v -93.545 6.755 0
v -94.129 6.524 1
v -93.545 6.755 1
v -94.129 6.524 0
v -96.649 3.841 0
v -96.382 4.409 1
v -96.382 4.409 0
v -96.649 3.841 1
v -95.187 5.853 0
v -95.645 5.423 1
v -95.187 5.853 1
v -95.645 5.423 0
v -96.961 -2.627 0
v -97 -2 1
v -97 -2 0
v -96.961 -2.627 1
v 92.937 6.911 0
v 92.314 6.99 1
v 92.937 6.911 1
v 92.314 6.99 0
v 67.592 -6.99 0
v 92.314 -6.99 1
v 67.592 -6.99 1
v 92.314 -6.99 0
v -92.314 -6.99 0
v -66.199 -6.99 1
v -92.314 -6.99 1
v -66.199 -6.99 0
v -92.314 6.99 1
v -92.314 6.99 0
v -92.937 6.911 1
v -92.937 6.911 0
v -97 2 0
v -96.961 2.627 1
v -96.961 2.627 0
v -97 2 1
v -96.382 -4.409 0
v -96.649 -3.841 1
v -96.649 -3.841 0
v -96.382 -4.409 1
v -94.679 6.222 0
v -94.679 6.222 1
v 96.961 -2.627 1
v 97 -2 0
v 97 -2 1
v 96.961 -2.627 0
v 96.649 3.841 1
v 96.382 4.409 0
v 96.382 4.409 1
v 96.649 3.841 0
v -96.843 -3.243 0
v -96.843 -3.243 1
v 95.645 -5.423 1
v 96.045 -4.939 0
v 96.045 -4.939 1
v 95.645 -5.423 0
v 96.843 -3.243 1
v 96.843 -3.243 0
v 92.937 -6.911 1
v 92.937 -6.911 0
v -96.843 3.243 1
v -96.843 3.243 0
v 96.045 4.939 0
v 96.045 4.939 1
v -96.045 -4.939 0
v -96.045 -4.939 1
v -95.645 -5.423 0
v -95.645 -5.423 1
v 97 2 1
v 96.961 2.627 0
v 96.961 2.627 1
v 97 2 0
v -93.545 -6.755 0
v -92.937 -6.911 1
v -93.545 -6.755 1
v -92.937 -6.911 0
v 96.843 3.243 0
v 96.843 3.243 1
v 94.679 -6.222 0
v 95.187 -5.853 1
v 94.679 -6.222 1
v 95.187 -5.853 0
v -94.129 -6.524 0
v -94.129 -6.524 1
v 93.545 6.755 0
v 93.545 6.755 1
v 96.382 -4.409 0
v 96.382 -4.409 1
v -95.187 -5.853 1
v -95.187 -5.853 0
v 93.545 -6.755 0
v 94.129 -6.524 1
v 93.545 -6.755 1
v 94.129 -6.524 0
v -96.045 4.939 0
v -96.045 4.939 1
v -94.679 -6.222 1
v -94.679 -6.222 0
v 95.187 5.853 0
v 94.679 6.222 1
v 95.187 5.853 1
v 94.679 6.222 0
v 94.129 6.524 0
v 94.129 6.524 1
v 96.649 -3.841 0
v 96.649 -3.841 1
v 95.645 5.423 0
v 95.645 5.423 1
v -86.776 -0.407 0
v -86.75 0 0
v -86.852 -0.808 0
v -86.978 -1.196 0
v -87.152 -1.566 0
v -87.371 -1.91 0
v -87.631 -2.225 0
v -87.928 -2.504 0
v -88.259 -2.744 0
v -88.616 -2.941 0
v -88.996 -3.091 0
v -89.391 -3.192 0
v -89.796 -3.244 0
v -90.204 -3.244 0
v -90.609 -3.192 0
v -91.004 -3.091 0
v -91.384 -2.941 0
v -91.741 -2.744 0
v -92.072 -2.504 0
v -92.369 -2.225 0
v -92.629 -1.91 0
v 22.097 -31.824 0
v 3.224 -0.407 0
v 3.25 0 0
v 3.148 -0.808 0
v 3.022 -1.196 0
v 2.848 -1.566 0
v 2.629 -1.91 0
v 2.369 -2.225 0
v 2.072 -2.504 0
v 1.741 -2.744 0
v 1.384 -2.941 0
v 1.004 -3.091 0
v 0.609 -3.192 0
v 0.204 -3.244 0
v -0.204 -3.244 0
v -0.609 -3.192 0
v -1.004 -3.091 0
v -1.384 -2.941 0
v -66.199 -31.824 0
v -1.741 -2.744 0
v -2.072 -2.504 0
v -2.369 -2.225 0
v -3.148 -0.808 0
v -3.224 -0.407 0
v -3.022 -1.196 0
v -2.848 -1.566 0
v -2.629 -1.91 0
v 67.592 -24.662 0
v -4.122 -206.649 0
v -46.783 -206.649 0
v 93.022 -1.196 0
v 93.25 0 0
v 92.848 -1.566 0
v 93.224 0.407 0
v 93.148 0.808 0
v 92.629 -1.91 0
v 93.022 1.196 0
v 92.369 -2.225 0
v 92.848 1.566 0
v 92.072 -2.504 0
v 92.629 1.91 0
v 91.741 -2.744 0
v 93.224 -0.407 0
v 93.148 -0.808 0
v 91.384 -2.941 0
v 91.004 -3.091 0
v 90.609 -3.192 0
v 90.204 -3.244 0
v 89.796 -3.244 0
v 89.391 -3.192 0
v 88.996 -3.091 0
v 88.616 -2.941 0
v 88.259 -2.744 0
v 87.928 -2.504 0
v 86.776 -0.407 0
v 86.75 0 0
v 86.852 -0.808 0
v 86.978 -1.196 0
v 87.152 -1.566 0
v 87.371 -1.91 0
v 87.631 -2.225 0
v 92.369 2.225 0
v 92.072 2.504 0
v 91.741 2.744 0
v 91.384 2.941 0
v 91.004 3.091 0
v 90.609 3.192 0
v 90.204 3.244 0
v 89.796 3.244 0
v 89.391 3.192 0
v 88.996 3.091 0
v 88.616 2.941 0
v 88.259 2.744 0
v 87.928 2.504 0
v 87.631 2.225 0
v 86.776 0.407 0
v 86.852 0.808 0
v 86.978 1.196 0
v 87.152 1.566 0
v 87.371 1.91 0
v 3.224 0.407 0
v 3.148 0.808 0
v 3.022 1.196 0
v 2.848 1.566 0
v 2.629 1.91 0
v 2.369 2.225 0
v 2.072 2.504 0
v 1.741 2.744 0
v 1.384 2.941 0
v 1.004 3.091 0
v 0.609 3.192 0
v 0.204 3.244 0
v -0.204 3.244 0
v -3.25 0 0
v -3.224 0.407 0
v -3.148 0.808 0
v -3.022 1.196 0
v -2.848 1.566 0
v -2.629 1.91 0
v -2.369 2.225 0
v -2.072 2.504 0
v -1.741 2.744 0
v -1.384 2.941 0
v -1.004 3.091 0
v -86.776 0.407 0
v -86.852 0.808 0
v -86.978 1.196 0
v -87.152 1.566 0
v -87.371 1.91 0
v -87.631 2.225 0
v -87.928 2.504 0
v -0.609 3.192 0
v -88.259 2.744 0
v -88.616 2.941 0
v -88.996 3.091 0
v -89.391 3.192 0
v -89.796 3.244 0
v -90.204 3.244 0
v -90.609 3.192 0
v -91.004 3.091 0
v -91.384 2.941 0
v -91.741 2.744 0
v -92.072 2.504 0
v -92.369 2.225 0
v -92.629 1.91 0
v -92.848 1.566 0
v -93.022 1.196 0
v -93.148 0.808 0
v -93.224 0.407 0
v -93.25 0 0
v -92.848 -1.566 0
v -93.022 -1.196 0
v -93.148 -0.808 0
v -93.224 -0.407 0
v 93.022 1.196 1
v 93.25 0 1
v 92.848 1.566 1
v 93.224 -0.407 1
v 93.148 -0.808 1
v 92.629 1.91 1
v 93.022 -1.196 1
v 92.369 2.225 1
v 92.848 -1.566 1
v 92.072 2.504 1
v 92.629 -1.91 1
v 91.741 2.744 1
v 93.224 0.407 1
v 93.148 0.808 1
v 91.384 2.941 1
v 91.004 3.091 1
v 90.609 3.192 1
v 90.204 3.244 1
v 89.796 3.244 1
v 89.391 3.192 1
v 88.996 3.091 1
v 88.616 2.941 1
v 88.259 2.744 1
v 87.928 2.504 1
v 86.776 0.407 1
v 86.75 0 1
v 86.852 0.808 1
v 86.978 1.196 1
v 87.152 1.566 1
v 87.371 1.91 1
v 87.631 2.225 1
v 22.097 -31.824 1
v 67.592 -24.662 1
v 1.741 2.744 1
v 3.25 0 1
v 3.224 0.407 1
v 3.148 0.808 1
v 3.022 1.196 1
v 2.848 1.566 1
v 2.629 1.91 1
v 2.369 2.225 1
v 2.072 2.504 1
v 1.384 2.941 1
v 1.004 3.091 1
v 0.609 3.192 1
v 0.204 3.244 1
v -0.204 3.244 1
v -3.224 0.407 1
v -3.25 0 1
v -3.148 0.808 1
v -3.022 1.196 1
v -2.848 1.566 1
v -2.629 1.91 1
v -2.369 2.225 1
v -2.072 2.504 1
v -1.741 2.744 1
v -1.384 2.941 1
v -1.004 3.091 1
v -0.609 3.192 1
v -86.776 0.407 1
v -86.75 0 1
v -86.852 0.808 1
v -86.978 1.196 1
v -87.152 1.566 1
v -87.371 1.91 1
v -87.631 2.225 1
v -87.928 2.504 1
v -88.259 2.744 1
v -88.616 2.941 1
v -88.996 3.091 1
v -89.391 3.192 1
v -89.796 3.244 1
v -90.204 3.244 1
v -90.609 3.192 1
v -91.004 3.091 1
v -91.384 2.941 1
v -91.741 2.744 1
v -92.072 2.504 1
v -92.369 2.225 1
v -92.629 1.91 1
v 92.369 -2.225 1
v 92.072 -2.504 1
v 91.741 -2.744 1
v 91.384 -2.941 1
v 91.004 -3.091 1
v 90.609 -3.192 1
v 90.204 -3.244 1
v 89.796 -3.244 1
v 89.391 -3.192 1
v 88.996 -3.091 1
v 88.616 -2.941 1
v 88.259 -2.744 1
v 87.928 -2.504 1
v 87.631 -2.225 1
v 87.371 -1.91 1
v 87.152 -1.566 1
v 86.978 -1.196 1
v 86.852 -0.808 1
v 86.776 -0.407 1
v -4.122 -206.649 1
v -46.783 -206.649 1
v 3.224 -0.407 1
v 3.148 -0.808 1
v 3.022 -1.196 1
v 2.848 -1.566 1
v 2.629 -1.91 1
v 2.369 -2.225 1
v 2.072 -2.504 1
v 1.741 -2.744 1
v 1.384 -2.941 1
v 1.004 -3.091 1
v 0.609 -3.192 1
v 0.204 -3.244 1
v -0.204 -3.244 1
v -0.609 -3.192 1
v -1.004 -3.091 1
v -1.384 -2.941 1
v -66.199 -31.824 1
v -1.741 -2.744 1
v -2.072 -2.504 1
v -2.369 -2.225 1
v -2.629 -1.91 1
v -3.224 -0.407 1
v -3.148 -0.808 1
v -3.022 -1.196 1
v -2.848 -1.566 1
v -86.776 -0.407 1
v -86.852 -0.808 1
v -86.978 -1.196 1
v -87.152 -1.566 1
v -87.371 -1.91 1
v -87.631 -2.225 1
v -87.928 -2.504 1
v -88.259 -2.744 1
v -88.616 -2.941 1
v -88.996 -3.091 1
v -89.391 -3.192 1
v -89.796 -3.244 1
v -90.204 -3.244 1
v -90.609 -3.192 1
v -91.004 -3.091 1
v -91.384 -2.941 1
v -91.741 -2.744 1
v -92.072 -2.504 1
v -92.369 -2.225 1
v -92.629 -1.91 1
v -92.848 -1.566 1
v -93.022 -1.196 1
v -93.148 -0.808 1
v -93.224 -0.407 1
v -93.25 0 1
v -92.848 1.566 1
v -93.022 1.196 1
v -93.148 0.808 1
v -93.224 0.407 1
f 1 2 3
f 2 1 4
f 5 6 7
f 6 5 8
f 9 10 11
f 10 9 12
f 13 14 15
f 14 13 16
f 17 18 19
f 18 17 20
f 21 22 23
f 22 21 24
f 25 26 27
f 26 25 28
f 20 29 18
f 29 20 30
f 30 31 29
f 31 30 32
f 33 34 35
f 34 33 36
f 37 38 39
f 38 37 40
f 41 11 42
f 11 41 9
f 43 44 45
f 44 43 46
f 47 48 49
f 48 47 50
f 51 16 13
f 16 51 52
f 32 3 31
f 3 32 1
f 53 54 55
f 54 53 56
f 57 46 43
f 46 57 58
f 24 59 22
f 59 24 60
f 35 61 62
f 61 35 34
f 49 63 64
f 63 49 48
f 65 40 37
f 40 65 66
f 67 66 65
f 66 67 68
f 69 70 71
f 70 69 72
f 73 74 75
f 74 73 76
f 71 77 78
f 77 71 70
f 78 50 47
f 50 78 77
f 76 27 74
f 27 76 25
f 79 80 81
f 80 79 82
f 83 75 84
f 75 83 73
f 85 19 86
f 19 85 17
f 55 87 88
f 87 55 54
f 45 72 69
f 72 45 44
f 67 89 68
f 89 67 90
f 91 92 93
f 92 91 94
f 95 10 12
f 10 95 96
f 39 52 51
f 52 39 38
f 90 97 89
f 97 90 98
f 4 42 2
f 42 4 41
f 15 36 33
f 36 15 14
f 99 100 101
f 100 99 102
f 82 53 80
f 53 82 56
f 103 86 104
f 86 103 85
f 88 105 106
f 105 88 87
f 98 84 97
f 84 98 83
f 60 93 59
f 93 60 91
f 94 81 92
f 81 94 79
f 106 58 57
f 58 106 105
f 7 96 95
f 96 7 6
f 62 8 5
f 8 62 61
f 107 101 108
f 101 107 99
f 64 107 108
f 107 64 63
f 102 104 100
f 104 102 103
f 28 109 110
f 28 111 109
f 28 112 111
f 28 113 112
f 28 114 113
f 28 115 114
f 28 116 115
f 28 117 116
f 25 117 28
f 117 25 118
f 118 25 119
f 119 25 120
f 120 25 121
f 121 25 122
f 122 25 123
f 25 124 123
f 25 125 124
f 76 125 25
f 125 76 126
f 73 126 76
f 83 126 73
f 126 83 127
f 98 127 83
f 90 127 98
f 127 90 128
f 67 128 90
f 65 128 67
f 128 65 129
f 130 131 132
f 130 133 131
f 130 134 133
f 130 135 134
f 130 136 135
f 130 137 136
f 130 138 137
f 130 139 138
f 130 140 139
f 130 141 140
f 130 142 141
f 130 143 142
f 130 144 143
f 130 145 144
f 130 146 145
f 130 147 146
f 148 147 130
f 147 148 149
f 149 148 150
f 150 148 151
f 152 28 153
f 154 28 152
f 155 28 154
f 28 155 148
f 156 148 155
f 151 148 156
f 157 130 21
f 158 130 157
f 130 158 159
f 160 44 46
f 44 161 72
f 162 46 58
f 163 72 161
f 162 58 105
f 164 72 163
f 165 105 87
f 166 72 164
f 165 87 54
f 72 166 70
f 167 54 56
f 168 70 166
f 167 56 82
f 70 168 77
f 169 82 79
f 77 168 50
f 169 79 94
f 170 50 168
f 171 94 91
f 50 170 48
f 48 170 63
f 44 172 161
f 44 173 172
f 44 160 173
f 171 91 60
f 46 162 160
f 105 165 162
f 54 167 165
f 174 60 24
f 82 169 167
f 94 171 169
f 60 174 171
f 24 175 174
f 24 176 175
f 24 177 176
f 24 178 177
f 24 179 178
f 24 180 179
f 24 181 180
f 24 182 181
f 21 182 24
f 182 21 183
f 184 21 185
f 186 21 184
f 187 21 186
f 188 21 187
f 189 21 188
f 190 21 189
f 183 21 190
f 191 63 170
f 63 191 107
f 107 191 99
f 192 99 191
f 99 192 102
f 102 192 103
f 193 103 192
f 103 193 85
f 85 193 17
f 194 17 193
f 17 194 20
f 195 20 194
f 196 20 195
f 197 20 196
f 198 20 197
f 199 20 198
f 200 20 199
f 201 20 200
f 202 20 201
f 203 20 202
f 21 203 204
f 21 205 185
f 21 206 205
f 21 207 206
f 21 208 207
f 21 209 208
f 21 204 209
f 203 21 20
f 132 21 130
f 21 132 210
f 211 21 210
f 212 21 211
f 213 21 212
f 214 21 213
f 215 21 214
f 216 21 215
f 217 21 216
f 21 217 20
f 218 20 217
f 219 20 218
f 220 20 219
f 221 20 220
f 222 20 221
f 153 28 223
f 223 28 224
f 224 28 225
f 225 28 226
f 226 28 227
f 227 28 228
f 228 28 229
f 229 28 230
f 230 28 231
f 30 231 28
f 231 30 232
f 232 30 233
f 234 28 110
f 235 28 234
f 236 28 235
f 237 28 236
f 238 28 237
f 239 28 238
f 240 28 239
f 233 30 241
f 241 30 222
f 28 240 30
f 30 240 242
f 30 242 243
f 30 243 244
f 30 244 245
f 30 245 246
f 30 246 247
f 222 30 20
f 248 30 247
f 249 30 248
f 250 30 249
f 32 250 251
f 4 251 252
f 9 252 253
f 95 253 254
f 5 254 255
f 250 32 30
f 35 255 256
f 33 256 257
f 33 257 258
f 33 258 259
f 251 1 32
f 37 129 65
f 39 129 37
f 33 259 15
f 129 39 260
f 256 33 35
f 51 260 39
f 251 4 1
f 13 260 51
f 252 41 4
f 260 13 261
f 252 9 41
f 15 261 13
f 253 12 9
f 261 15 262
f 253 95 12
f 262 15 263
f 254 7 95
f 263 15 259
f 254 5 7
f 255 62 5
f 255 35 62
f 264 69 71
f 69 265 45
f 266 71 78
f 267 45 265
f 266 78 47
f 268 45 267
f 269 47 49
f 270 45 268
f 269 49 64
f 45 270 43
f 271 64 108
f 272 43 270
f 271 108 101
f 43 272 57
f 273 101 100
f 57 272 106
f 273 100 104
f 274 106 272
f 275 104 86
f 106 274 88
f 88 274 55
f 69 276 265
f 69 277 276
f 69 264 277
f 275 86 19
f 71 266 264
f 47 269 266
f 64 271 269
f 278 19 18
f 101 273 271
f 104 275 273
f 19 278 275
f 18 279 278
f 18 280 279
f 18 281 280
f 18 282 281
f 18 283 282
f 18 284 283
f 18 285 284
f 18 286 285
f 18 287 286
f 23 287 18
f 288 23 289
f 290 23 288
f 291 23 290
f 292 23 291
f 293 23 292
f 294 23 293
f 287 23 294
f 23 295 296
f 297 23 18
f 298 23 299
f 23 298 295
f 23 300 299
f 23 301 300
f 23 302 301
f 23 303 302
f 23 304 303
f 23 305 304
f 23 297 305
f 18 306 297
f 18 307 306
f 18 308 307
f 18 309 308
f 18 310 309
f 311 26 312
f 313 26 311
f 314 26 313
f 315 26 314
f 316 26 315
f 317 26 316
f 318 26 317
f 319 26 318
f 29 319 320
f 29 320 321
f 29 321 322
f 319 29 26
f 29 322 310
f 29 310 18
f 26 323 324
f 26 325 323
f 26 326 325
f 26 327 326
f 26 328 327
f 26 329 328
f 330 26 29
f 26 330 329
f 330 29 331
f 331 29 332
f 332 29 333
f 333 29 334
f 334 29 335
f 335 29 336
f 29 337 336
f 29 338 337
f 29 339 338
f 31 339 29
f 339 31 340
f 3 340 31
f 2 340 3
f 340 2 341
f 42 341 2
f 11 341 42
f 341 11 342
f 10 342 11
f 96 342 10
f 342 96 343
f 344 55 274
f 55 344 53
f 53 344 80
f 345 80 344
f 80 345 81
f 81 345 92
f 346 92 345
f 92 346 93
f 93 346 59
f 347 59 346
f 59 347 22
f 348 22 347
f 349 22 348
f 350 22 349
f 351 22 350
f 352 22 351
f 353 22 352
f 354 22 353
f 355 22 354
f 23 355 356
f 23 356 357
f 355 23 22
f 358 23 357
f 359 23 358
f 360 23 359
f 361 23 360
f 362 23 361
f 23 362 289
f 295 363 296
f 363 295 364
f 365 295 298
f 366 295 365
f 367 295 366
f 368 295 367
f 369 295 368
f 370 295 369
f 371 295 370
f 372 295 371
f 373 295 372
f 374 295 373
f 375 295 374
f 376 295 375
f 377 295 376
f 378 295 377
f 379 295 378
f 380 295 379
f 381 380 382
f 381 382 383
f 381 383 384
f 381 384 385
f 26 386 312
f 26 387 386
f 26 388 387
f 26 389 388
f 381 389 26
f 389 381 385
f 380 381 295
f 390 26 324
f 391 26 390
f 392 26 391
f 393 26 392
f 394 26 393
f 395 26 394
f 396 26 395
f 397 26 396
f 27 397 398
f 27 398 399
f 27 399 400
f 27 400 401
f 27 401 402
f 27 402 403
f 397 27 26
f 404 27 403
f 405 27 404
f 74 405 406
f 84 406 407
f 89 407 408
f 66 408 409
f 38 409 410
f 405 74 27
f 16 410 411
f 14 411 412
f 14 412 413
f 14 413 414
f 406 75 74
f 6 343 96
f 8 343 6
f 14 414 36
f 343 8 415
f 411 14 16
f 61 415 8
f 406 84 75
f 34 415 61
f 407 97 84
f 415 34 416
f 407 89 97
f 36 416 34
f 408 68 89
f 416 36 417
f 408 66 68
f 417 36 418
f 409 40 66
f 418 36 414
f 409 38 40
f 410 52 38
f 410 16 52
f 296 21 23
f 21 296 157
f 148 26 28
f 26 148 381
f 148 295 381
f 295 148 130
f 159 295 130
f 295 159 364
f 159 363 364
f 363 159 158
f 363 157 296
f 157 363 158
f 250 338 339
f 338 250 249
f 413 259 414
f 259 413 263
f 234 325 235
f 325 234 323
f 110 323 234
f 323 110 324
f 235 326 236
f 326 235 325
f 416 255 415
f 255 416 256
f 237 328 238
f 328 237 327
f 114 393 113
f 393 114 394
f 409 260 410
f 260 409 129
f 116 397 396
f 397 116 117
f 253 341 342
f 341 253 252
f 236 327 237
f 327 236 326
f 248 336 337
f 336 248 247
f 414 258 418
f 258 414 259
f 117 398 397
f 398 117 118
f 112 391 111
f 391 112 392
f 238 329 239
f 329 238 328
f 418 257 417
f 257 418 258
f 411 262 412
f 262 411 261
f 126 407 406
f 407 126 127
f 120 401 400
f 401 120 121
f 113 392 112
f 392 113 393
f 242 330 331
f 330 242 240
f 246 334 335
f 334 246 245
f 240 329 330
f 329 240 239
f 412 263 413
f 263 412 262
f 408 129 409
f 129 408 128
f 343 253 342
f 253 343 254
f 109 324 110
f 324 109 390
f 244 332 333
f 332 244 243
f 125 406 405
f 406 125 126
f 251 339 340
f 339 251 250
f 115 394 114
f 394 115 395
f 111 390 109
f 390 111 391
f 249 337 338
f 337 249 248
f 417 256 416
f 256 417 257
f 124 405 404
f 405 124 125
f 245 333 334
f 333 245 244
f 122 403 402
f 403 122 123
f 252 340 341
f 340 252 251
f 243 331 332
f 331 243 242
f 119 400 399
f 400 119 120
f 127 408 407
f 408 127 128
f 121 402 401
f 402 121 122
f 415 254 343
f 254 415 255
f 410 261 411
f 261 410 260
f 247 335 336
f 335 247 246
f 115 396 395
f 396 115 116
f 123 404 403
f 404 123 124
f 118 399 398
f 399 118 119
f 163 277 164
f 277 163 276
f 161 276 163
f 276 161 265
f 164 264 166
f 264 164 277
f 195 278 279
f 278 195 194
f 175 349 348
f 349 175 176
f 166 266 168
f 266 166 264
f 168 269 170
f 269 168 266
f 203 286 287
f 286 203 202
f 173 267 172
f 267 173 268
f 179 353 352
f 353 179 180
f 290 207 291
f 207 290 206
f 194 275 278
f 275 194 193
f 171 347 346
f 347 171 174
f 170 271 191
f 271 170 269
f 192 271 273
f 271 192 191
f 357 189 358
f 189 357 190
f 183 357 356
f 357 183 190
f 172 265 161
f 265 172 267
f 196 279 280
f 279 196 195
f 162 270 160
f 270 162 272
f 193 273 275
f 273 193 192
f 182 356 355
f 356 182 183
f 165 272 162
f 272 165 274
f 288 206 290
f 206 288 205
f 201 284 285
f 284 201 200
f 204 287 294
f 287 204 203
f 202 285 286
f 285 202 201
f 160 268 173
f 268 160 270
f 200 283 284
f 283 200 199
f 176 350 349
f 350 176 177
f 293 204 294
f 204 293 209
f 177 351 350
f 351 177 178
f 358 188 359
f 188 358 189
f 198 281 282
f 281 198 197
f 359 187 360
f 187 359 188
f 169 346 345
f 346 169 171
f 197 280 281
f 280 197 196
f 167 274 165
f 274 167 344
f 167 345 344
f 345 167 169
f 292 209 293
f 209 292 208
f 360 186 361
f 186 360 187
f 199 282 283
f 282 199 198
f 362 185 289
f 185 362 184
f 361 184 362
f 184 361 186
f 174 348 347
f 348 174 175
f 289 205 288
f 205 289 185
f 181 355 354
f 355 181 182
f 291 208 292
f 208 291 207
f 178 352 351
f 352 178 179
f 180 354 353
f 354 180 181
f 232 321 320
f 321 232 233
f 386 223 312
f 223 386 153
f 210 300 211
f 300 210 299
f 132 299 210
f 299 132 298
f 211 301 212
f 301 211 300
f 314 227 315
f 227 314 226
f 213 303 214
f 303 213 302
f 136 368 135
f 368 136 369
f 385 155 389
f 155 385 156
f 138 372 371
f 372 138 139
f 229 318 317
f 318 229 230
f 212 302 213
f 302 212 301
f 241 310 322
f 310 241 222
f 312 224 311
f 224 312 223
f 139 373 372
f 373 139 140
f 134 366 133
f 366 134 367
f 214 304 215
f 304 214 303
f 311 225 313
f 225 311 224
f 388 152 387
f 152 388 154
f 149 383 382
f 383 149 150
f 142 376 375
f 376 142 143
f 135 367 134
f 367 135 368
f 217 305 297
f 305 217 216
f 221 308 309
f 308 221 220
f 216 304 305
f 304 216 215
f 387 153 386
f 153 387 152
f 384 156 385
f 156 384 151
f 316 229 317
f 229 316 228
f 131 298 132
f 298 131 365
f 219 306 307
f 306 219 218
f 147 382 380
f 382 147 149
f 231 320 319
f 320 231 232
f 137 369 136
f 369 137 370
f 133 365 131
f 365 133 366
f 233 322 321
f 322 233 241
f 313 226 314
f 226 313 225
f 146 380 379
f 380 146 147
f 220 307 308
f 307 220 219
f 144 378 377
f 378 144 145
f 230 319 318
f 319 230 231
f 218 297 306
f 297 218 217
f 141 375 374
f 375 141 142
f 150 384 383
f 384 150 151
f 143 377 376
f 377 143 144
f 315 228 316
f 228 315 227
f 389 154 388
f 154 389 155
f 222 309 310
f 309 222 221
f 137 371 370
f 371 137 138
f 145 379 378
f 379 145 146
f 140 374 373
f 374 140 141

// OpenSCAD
$fn = 50;


difference() {
	union() {
		translate(v = [0, 0, 0]) {
			rotate(a = [0, 0, 0]) {
				hull() {
					translate(v = [-92.0000000000, 2.0000000000, 0]) {
						rotate(a = [0, 0, 0]) {
							translate(v = [0, 0, 0]) {
								rotate(a = [0, 0, 0]) {
									cylinder(h = 1, r = 5);
								}
							}
						}
					}
					translate(v = [92.0000000000, 2.0000000000, 0]) {
						rotate(a = [0, 0, 0]) {
							translate(v = [0, 0, 0]) {
								rotate(a = [0, 0, 0]) {
									cylinder(h = 1, r = 5);
								}
							}
						}
					}
					translate(v = [-92.0000000000, -2.0000000000, 0]) {
						rotate(a = [0, 0, 0]) {
							translate(v = [0, 0, 0]) {
								rotate(a = [0, 0, 0]) {
									cylinder(h = 1, r = 5);
								}
							}
						}
					}
					translate(v = [92.0000000000, -2.0000000000, 0]) {
						rotate(a = [0, 0, 0]) {
							translate(v = [0, 0, 0]) {
								rotate(a = [0, 0, 0]) {
									cylinder(h = 1, r = 5);
								}
							}
						}
					}
				}
			}
		}
		translate(v = [0, 0, 0]) {
			rotate(a = [0, 0, 0]) {
				linear_extrude(height = 1) {
					text(font = "DejaVu Sans Mono:style=Bold", halign = "center", size = 209.0000000000, text = "7", valign = "top");
				}
			}
		}
	}
	union() {
		translate(v = [-90.0000000000, 0.0000000000, -125.0000000000]) {
			rotate(a = [0, 0, 0]) {
				cylinder(h = 250, r = 3.2500000000);
			}
		}
		translate(v = [90.0000000000, 0.0000000000, -125.0000000000]) {
			rotate(a = [0, 0, 0]) {
				cylinder(h = 250, r = 3.2500000000);
			}
		}
		translate(v = [90.0000000000, 0.0000000000, -125.0000000000]) {
			rotate(a = [0, 0, 0]) {
				cylinder(h = 250, r = 3.2500000000);
			}
		}
		translate(v = [0, 0, -125.0000000000]) {
			rotate(a = [0, 0, 0]) {
				cylinder(h = 250, r = 3.2500000000);
			}
		}
	}
}
